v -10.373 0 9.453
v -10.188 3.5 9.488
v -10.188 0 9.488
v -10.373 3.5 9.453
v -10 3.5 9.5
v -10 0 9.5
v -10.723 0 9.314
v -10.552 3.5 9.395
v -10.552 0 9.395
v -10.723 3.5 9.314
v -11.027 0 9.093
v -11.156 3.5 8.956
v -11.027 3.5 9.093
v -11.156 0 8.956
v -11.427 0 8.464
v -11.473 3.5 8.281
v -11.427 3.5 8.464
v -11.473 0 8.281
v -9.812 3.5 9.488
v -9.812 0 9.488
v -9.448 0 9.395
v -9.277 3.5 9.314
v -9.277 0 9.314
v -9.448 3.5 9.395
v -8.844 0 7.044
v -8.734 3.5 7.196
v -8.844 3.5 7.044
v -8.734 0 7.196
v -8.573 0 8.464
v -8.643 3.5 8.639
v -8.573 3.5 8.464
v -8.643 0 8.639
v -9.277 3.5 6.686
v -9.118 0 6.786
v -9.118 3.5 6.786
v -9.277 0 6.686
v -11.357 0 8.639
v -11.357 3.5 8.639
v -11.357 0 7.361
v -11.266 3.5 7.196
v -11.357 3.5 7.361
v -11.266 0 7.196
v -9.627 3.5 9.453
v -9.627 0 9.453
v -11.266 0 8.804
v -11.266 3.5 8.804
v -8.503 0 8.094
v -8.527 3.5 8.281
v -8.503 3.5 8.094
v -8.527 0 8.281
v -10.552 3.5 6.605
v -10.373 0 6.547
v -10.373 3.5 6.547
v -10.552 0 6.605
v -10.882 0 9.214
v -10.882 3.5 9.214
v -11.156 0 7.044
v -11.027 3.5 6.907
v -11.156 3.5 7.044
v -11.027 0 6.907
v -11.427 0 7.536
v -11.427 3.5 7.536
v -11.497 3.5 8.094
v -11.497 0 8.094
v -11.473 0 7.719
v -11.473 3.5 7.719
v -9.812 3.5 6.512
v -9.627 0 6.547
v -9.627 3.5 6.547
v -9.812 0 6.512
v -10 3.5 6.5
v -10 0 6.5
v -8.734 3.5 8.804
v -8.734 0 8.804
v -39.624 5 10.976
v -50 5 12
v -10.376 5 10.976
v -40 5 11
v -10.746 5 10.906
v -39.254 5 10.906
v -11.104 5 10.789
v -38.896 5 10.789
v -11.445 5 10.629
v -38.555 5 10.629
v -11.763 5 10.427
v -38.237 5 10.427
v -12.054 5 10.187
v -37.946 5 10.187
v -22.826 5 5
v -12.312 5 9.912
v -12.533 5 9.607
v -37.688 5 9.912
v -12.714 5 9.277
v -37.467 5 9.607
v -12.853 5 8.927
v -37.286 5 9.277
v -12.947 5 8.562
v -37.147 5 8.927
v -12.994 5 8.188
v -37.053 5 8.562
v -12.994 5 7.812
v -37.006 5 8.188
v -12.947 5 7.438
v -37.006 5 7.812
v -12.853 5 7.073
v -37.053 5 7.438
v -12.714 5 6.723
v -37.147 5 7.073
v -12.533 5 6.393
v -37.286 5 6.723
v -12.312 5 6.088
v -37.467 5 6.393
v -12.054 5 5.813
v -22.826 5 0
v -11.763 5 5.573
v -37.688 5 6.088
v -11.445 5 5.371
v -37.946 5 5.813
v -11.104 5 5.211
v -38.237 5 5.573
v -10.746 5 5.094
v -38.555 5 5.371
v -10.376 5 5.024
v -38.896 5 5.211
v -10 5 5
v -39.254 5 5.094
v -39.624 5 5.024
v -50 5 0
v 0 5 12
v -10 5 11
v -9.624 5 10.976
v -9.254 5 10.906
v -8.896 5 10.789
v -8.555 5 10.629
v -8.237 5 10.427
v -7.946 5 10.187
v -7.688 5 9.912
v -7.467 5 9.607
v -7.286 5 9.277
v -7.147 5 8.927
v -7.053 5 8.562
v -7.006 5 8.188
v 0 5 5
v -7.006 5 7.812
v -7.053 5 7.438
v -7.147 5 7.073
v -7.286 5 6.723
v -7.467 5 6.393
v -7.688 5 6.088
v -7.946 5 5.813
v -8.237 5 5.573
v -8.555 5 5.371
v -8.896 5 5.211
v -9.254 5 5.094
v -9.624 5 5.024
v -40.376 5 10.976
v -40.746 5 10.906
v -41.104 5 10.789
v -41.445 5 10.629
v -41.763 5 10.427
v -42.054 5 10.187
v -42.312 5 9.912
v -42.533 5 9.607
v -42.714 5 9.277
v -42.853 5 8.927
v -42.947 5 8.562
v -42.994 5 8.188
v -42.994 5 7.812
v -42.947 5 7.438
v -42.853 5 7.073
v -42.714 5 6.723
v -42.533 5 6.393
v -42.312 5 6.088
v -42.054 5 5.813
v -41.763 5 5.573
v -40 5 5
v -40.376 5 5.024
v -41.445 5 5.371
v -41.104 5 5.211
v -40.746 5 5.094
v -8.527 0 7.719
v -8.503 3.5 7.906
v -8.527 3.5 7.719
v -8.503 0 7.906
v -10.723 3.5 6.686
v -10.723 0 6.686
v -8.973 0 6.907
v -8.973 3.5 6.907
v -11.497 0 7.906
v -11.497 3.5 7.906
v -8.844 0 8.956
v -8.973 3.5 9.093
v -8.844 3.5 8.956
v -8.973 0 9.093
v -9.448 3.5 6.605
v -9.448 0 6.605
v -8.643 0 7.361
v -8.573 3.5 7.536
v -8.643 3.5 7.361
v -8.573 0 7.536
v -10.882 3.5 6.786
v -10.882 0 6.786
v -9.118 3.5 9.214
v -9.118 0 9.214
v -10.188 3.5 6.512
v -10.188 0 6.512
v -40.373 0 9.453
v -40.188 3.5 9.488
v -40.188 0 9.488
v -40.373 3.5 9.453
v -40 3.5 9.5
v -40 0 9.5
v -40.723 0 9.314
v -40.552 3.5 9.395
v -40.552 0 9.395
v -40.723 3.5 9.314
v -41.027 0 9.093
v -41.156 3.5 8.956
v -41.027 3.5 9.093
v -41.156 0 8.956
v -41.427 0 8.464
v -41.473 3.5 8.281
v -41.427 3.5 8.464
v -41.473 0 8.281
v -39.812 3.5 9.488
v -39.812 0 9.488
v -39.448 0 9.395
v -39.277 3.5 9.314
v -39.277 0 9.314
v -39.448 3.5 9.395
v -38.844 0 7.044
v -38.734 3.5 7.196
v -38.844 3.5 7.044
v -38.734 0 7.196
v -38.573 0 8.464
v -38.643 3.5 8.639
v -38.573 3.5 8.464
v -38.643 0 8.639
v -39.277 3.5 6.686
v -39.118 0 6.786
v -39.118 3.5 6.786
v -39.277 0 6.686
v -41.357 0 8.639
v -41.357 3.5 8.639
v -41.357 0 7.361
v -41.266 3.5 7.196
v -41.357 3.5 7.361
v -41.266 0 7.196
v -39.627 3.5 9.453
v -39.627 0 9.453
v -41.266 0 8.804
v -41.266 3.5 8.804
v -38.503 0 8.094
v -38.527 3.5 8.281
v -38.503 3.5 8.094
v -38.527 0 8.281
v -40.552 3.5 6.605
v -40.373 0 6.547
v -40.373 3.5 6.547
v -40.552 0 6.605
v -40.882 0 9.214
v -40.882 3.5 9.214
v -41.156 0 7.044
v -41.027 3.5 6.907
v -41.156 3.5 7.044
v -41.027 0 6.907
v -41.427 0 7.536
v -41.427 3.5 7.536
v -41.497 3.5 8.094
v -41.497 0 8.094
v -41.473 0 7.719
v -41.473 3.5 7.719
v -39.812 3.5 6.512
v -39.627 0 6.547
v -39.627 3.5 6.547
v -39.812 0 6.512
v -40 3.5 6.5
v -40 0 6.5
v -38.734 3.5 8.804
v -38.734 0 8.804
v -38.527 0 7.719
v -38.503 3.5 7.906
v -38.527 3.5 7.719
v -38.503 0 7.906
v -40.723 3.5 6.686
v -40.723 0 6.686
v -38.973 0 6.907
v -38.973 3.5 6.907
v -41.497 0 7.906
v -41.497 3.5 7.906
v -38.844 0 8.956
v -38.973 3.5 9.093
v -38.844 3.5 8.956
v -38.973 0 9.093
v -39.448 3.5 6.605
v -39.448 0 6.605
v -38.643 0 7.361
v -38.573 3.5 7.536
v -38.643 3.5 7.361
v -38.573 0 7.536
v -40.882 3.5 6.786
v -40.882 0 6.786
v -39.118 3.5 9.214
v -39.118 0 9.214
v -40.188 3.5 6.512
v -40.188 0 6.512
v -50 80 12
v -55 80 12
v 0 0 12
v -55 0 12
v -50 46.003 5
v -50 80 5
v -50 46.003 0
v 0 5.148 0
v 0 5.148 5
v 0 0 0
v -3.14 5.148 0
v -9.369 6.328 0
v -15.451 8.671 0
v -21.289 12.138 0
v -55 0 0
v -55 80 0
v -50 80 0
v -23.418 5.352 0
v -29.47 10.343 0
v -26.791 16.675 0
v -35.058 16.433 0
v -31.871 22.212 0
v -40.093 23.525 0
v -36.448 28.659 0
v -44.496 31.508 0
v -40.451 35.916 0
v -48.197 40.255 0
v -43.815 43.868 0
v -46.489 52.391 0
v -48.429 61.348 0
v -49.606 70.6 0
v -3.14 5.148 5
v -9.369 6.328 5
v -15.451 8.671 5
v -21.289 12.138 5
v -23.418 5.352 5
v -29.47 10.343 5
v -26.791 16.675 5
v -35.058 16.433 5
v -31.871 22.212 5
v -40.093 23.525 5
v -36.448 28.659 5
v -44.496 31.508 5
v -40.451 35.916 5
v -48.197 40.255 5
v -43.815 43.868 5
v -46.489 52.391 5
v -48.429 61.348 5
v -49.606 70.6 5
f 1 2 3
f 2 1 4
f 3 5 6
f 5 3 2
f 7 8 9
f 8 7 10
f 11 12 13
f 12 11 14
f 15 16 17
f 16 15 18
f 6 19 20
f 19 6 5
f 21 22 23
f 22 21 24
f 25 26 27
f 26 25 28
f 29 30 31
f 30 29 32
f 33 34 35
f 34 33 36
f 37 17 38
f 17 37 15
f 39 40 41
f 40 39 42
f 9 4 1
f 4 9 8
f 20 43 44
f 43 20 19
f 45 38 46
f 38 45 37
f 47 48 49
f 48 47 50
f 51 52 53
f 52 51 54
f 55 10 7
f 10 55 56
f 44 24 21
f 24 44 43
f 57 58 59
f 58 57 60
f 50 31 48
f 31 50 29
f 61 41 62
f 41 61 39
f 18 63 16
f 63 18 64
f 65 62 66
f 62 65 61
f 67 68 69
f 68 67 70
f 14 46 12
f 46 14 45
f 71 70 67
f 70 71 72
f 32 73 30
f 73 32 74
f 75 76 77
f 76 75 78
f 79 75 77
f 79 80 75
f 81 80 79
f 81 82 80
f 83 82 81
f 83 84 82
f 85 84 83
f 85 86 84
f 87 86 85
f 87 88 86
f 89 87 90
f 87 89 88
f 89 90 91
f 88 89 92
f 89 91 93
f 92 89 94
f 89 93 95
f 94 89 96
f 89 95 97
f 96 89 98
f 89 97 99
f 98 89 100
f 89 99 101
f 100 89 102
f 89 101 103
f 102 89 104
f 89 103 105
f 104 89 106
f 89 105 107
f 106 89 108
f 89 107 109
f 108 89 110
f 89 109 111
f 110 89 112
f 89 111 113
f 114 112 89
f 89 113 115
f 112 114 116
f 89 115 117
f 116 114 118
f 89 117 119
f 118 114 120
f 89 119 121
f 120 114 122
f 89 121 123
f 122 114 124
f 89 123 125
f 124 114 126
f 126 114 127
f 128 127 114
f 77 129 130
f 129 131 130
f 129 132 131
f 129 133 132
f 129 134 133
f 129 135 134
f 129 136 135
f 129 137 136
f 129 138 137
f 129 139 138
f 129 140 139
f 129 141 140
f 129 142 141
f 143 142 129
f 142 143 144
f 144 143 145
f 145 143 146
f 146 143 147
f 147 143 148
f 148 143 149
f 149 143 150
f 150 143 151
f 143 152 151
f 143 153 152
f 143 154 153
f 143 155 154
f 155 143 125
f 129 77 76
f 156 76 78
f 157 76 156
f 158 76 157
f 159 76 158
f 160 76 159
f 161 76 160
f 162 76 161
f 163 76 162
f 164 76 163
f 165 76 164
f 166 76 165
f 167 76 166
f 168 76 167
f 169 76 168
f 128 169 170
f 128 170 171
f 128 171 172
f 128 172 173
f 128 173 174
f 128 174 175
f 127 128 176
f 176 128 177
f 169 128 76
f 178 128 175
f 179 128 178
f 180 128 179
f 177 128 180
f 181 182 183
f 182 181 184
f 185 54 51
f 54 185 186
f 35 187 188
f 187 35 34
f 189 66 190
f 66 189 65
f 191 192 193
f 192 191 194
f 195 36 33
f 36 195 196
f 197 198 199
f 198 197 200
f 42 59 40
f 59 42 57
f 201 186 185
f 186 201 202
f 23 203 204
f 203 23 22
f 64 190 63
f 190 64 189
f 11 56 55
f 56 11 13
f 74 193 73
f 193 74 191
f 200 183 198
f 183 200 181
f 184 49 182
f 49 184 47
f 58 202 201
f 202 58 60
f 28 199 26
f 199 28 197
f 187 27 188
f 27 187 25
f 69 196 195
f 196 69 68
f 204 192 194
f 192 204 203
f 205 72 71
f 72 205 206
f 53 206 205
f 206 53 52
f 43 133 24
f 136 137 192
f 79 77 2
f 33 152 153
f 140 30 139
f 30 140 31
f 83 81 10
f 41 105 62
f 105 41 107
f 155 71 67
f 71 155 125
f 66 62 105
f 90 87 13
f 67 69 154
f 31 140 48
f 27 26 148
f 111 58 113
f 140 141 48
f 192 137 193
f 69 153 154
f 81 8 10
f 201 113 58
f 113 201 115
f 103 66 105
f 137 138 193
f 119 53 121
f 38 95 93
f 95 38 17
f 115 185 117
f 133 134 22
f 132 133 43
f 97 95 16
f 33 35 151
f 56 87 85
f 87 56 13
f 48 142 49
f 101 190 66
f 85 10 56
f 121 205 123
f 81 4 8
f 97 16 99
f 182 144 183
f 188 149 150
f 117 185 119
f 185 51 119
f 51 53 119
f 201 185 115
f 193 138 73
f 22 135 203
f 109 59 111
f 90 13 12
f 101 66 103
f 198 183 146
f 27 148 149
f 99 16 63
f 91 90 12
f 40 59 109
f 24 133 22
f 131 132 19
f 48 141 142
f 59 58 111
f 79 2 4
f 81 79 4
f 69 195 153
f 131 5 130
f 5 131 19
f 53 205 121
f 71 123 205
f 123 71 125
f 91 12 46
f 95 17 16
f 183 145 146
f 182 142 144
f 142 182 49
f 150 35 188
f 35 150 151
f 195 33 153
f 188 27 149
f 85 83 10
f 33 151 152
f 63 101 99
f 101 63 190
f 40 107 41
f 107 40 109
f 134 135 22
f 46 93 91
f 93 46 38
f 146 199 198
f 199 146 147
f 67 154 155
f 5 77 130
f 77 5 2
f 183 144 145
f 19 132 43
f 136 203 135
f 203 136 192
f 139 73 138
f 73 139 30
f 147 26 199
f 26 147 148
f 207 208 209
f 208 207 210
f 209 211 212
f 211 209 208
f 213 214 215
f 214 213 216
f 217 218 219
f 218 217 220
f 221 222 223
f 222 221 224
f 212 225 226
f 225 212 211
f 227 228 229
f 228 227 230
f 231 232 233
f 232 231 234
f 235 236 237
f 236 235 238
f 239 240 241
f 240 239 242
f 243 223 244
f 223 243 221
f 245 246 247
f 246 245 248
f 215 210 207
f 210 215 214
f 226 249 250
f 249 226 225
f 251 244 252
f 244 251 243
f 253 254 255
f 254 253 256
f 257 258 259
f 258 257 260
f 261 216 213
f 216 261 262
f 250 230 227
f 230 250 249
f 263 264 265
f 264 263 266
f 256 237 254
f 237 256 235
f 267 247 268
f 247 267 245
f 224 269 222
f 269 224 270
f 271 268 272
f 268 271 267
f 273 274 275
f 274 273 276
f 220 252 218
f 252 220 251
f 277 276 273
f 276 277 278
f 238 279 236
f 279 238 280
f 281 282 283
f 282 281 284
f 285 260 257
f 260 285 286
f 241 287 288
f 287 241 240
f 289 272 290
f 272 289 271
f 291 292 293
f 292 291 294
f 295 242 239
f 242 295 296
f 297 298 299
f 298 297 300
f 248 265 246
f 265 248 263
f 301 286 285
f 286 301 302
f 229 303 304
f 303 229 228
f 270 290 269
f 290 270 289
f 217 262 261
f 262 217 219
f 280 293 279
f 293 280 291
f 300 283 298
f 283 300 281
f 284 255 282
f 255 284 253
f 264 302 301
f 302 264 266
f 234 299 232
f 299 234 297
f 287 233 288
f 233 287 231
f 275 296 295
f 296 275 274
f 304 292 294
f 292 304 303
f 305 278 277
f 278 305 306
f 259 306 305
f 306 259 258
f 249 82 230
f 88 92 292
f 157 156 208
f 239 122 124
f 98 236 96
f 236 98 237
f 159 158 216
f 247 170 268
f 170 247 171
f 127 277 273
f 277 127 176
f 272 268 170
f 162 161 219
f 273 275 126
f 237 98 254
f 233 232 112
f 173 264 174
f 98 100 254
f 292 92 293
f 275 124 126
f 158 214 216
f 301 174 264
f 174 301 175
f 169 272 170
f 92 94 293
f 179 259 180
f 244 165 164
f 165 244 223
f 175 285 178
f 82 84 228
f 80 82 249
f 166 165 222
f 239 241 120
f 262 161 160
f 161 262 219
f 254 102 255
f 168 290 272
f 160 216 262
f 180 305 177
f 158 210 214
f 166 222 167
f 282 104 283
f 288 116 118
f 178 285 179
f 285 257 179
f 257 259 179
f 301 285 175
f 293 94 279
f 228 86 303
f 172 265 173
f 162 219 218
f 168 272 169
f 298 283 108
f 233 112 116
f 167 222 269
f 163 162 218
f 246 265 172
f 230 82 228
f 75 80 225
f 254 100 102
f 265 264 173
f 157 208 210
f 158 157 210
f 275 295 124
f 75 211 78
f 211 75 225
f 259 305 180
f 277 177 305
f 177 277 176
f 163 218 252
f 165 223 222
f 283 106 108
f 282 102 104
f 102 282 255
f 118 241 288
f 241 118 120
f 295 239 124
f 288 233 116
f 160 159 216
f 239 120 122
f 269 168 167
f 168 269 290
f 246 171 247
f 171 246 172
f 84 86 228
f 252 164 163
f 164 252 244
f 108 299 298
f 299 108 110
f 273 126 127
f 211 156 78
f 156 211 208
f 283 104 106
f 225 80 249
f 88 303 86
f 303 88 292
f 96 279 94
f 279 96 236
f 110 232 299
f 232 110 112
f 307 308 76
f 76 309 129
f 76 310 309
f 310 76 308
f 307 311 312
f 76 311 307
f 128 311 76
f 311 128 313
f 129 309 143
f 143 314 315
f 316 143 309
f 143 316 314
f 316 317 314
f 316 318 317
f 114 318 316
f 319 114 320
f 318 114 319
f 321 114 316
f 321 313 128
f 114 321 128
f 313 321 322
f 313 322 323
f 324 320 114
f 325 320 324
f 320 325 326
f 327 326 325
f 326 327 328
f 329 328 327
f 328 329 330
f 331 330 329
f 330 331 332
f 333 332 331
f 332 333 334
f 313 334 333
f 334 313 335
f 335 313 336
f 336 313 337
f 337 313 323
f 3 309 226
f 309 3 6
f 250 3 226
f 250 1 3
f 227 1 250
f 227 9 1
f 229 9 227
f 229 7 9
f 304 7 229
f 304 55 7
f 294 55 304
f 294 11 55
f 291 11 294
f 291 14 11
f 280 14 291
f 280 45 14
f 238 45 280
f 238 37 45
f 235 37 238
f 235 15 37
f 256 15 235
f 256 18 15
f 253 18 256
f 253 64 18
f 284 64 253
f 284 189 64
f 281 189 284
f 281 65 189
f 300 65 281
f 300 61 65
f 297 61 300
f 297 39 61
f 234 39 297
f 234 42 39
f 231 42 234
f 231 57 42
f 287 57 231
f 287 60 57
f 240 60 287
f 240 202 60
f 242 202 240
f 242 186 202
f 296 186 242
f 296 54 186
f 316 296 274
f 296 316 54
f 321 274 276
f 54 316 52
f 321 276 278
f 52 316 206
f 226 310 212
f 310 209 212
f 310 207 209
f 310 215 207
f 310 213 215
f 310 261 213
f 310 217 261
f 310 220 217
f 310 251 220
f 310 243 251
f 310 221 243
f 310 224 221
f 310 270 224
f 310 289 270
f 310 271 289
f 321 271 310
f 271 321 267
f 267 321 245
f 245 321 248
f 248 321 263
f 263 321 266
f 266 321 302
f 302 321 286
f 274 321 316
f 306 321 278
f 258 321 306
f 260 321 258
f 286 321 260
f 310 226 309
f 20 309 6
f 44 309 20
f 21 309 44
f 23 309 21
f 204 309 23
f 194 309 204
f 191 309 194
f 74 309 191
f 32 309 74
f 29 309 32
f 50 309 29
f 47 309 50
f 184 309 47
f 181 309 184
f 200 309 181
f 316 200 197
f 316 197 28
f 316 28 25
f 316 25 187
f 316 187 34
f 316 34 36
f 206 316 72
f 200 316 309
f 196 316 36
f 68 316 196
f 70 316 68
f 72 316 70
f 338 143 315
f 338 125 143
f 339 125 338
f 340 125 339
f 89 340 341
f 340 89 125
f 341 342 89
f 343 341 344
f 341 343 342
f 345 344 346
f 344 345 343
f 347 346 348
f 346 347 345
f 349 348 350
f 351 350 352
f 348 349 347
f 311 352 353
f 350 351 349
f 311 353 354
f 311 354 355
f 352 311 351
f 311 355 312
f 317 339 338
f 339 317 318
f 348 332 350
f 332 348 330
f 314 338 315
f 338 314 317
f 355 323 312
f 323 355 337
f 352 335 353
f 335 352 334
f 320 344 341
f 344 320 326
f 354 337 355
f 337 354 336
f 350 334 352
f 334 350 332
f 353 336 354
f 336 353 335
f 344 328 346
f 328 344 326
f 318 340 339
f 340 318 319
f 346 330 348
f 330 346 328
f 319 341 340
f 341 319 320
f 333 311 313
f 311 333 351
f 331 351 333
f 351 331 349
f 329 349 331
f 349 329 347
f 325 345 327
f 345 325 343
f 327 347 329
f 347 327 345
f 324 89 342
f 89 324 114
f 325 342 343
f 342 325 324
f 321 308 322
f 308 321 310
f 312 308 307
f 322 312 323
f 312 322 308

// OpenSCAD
// wall mount
$fn = 50;
width = 12;
depth= 80;
height = 50;

top_tickness = 5;
cut_scale = 1.1;
drill_hole = 3;
drill_hole_top = 6; 

drilldiff = drill_hole_top-drill_hole;



module hole(){
    cylinder(h= top_tickness+1, d=drill_hole);
    cylinder(h=drilldiff/2, d1 = drill_hole_top, d2=drill_hole);
}
//lay flat printing
rotate([0,-90,0]){

    //top
    translate([0,0,height])
    cube([width, depth, top_tickness]);


    //wall
    difference(){
        cube([width, top_tickness, height]);
        translate([width*2/3,top_tickness,  height*1/5])
        rotate([90,0,0])    
        hole();
        translate([width*2/3,top_tickness,  height*4/5])
        rotate([90,0,0])    
        hole();
    }
    //rim
    intersection(){
    difference(){
        
        cube([top_tickness, depth, height]);
        translate([0,depth,0])
        scale([1,(depth-top_tickness)/height,1])
        rotate([0,90,0])
        cylinder(h=width, r=height);
    }
        translate([0,depth,0])
        scale(cut_scale)
        scale([1,(depth-top_tickness)/height,1])
        rotate([0,90,0])
        cylinder(h=width, r=height);
    }

}
